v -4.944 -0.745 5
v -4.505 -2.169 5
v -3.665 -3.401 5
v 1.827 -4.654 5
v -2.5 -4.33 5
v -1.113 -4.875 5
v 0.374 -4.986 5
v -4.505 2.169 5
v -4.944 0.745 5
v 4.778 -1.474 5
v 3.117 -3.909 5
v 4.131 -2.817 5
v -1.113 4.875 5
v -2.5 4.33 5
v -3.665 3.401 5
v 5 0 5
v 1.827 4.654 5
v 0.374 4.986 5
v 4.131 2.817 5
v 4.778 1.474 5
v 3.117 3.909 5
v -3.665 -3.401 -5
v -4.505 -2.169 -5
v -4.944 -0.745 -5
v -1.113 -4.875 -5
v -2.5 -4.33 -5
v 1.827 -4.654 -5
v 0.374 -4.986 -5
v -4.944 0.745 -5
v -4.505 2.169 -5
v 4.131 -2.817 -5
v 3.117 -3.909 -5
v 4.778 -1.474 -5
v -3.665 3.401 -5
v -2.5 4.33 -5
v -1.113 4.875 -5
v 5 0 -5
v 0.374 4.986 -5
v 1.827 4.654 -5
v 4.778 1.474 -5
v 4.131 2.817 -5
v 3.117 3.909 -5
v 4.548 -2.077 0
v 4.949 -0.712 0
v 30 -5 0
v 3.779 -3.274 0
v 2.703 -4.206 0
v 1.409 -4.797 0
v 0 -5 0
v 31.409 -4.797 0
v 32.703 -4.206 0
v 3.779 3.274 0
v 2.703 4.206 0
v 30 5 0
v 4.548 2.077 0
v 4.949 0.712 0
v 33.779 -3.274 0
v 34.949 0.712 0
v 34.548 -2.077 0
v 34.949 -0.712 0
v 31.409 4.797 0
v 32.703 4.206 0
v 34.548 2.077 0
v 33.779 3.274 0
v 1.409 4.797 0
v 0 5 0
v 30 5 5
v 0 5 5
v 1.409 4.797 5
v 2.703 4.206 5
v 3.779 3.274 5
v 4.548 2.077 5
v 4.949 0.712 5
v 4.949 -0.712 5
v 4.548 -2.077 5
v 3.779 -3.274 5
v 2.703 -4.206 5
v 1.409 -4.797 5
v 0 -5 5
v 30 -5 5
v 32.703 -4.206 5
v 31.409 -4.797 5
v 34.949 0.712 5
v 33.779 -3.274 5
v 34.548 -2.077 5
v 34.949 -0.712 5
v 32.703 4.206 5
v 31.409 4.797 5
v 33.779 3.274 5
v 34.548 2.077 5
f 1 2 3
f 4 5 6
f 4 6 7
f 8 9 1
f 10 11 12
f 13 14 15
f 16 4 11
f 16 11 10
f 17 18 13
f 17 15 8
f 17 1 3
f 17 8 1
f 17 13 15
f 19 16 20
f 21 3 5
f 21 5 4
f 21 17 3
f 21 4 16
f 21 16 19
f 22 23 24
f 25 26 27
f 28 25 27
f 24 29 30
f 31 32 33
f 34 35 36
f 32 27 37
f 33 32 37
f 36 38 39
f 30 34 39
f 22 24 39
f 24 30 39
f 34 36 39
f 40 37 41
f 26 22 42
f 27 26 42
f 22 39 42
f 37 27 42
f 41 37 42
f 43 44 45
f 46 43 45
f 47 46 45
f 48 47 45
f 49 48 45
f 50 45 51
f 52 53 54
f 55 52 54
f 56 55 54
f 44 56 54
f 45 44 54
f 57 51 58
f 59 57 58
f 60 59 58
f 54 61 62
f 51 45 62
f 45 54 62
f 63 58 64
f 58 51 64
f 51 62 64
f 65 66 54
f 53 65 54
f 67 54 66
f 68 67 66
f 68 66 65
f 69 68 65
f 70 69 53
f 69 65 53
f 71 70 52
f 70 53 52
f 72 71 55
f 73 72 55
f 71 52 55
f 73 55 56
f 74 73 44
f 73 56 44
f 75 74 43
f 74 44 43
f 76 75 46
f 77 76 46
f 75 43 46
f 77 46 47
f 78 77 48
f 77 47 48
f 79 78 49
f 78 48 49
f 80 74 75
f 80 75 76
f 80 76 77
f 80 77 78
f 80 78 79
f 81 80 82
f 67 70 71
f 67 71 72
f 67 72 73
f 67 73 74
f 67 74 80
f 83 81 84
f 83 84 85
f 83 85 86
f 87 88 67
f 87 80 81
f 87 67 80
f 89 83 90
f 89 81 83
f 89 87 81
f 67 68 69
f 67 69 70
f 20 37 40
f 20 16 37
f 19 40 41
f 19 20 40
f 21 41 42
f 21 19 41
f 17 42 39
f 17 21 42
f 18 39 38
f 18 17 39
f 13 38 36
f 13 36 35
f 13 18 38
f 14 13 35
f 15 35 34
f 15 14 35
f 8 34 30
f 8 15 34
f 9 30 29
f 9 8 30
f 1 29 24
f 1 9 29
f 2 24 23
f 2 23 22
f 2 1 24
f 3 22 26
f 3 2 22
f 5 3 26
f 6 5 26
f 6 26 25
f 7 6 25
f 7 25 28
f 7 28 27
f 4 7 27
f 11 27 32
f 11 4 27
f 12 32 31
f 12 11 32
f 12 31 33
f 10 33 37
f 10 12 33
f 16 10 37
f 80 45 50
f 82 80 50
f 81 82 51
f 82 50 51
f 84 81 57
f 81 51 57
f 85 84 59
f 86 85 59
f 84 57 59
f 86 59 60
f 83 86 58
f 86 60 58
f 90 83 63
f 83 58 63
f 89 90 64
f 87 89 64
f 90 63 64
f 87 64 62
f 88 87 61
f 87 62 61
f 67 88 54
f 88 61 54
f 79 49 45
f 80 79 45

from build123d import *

# Parameters (mm, degrees)
F0_R     = 5
F2_DEPTH = 5
F3_DEPTH = 5


with BuildPart() as f2:
    # F0 (on Top) → F2 (new body)
    with BuildSketch(Plane.XY):
        Circle(F0_R)
    extrude(amount=F2_DEPTH)

    # F3 (add): a face of the model
    f3_faces = [f2.faces().sort_by_distance(p)[0] for p in [
        (0, 0, 0),
    ]]
    extrude(f3_faces, amount=F3_DEPTH)


with BuildPart() as f2b:
    # F1 (on Top) → F2, piece 2 (new body)
    with BuildSketch(Plane.XY):
        with BuildLine():
            Line((30, 5), (0, 5))
            ThreePointArc((0, 5), (5, 0), (0, -5))
            Line((0, -5), (30, -5))
            ThreePointArc((30, -5), (35, 0), (30, 5))
        make_face()
    extrude(amount=F2_DEPTH)


solid = Compound([f2.part, f2b.part])
